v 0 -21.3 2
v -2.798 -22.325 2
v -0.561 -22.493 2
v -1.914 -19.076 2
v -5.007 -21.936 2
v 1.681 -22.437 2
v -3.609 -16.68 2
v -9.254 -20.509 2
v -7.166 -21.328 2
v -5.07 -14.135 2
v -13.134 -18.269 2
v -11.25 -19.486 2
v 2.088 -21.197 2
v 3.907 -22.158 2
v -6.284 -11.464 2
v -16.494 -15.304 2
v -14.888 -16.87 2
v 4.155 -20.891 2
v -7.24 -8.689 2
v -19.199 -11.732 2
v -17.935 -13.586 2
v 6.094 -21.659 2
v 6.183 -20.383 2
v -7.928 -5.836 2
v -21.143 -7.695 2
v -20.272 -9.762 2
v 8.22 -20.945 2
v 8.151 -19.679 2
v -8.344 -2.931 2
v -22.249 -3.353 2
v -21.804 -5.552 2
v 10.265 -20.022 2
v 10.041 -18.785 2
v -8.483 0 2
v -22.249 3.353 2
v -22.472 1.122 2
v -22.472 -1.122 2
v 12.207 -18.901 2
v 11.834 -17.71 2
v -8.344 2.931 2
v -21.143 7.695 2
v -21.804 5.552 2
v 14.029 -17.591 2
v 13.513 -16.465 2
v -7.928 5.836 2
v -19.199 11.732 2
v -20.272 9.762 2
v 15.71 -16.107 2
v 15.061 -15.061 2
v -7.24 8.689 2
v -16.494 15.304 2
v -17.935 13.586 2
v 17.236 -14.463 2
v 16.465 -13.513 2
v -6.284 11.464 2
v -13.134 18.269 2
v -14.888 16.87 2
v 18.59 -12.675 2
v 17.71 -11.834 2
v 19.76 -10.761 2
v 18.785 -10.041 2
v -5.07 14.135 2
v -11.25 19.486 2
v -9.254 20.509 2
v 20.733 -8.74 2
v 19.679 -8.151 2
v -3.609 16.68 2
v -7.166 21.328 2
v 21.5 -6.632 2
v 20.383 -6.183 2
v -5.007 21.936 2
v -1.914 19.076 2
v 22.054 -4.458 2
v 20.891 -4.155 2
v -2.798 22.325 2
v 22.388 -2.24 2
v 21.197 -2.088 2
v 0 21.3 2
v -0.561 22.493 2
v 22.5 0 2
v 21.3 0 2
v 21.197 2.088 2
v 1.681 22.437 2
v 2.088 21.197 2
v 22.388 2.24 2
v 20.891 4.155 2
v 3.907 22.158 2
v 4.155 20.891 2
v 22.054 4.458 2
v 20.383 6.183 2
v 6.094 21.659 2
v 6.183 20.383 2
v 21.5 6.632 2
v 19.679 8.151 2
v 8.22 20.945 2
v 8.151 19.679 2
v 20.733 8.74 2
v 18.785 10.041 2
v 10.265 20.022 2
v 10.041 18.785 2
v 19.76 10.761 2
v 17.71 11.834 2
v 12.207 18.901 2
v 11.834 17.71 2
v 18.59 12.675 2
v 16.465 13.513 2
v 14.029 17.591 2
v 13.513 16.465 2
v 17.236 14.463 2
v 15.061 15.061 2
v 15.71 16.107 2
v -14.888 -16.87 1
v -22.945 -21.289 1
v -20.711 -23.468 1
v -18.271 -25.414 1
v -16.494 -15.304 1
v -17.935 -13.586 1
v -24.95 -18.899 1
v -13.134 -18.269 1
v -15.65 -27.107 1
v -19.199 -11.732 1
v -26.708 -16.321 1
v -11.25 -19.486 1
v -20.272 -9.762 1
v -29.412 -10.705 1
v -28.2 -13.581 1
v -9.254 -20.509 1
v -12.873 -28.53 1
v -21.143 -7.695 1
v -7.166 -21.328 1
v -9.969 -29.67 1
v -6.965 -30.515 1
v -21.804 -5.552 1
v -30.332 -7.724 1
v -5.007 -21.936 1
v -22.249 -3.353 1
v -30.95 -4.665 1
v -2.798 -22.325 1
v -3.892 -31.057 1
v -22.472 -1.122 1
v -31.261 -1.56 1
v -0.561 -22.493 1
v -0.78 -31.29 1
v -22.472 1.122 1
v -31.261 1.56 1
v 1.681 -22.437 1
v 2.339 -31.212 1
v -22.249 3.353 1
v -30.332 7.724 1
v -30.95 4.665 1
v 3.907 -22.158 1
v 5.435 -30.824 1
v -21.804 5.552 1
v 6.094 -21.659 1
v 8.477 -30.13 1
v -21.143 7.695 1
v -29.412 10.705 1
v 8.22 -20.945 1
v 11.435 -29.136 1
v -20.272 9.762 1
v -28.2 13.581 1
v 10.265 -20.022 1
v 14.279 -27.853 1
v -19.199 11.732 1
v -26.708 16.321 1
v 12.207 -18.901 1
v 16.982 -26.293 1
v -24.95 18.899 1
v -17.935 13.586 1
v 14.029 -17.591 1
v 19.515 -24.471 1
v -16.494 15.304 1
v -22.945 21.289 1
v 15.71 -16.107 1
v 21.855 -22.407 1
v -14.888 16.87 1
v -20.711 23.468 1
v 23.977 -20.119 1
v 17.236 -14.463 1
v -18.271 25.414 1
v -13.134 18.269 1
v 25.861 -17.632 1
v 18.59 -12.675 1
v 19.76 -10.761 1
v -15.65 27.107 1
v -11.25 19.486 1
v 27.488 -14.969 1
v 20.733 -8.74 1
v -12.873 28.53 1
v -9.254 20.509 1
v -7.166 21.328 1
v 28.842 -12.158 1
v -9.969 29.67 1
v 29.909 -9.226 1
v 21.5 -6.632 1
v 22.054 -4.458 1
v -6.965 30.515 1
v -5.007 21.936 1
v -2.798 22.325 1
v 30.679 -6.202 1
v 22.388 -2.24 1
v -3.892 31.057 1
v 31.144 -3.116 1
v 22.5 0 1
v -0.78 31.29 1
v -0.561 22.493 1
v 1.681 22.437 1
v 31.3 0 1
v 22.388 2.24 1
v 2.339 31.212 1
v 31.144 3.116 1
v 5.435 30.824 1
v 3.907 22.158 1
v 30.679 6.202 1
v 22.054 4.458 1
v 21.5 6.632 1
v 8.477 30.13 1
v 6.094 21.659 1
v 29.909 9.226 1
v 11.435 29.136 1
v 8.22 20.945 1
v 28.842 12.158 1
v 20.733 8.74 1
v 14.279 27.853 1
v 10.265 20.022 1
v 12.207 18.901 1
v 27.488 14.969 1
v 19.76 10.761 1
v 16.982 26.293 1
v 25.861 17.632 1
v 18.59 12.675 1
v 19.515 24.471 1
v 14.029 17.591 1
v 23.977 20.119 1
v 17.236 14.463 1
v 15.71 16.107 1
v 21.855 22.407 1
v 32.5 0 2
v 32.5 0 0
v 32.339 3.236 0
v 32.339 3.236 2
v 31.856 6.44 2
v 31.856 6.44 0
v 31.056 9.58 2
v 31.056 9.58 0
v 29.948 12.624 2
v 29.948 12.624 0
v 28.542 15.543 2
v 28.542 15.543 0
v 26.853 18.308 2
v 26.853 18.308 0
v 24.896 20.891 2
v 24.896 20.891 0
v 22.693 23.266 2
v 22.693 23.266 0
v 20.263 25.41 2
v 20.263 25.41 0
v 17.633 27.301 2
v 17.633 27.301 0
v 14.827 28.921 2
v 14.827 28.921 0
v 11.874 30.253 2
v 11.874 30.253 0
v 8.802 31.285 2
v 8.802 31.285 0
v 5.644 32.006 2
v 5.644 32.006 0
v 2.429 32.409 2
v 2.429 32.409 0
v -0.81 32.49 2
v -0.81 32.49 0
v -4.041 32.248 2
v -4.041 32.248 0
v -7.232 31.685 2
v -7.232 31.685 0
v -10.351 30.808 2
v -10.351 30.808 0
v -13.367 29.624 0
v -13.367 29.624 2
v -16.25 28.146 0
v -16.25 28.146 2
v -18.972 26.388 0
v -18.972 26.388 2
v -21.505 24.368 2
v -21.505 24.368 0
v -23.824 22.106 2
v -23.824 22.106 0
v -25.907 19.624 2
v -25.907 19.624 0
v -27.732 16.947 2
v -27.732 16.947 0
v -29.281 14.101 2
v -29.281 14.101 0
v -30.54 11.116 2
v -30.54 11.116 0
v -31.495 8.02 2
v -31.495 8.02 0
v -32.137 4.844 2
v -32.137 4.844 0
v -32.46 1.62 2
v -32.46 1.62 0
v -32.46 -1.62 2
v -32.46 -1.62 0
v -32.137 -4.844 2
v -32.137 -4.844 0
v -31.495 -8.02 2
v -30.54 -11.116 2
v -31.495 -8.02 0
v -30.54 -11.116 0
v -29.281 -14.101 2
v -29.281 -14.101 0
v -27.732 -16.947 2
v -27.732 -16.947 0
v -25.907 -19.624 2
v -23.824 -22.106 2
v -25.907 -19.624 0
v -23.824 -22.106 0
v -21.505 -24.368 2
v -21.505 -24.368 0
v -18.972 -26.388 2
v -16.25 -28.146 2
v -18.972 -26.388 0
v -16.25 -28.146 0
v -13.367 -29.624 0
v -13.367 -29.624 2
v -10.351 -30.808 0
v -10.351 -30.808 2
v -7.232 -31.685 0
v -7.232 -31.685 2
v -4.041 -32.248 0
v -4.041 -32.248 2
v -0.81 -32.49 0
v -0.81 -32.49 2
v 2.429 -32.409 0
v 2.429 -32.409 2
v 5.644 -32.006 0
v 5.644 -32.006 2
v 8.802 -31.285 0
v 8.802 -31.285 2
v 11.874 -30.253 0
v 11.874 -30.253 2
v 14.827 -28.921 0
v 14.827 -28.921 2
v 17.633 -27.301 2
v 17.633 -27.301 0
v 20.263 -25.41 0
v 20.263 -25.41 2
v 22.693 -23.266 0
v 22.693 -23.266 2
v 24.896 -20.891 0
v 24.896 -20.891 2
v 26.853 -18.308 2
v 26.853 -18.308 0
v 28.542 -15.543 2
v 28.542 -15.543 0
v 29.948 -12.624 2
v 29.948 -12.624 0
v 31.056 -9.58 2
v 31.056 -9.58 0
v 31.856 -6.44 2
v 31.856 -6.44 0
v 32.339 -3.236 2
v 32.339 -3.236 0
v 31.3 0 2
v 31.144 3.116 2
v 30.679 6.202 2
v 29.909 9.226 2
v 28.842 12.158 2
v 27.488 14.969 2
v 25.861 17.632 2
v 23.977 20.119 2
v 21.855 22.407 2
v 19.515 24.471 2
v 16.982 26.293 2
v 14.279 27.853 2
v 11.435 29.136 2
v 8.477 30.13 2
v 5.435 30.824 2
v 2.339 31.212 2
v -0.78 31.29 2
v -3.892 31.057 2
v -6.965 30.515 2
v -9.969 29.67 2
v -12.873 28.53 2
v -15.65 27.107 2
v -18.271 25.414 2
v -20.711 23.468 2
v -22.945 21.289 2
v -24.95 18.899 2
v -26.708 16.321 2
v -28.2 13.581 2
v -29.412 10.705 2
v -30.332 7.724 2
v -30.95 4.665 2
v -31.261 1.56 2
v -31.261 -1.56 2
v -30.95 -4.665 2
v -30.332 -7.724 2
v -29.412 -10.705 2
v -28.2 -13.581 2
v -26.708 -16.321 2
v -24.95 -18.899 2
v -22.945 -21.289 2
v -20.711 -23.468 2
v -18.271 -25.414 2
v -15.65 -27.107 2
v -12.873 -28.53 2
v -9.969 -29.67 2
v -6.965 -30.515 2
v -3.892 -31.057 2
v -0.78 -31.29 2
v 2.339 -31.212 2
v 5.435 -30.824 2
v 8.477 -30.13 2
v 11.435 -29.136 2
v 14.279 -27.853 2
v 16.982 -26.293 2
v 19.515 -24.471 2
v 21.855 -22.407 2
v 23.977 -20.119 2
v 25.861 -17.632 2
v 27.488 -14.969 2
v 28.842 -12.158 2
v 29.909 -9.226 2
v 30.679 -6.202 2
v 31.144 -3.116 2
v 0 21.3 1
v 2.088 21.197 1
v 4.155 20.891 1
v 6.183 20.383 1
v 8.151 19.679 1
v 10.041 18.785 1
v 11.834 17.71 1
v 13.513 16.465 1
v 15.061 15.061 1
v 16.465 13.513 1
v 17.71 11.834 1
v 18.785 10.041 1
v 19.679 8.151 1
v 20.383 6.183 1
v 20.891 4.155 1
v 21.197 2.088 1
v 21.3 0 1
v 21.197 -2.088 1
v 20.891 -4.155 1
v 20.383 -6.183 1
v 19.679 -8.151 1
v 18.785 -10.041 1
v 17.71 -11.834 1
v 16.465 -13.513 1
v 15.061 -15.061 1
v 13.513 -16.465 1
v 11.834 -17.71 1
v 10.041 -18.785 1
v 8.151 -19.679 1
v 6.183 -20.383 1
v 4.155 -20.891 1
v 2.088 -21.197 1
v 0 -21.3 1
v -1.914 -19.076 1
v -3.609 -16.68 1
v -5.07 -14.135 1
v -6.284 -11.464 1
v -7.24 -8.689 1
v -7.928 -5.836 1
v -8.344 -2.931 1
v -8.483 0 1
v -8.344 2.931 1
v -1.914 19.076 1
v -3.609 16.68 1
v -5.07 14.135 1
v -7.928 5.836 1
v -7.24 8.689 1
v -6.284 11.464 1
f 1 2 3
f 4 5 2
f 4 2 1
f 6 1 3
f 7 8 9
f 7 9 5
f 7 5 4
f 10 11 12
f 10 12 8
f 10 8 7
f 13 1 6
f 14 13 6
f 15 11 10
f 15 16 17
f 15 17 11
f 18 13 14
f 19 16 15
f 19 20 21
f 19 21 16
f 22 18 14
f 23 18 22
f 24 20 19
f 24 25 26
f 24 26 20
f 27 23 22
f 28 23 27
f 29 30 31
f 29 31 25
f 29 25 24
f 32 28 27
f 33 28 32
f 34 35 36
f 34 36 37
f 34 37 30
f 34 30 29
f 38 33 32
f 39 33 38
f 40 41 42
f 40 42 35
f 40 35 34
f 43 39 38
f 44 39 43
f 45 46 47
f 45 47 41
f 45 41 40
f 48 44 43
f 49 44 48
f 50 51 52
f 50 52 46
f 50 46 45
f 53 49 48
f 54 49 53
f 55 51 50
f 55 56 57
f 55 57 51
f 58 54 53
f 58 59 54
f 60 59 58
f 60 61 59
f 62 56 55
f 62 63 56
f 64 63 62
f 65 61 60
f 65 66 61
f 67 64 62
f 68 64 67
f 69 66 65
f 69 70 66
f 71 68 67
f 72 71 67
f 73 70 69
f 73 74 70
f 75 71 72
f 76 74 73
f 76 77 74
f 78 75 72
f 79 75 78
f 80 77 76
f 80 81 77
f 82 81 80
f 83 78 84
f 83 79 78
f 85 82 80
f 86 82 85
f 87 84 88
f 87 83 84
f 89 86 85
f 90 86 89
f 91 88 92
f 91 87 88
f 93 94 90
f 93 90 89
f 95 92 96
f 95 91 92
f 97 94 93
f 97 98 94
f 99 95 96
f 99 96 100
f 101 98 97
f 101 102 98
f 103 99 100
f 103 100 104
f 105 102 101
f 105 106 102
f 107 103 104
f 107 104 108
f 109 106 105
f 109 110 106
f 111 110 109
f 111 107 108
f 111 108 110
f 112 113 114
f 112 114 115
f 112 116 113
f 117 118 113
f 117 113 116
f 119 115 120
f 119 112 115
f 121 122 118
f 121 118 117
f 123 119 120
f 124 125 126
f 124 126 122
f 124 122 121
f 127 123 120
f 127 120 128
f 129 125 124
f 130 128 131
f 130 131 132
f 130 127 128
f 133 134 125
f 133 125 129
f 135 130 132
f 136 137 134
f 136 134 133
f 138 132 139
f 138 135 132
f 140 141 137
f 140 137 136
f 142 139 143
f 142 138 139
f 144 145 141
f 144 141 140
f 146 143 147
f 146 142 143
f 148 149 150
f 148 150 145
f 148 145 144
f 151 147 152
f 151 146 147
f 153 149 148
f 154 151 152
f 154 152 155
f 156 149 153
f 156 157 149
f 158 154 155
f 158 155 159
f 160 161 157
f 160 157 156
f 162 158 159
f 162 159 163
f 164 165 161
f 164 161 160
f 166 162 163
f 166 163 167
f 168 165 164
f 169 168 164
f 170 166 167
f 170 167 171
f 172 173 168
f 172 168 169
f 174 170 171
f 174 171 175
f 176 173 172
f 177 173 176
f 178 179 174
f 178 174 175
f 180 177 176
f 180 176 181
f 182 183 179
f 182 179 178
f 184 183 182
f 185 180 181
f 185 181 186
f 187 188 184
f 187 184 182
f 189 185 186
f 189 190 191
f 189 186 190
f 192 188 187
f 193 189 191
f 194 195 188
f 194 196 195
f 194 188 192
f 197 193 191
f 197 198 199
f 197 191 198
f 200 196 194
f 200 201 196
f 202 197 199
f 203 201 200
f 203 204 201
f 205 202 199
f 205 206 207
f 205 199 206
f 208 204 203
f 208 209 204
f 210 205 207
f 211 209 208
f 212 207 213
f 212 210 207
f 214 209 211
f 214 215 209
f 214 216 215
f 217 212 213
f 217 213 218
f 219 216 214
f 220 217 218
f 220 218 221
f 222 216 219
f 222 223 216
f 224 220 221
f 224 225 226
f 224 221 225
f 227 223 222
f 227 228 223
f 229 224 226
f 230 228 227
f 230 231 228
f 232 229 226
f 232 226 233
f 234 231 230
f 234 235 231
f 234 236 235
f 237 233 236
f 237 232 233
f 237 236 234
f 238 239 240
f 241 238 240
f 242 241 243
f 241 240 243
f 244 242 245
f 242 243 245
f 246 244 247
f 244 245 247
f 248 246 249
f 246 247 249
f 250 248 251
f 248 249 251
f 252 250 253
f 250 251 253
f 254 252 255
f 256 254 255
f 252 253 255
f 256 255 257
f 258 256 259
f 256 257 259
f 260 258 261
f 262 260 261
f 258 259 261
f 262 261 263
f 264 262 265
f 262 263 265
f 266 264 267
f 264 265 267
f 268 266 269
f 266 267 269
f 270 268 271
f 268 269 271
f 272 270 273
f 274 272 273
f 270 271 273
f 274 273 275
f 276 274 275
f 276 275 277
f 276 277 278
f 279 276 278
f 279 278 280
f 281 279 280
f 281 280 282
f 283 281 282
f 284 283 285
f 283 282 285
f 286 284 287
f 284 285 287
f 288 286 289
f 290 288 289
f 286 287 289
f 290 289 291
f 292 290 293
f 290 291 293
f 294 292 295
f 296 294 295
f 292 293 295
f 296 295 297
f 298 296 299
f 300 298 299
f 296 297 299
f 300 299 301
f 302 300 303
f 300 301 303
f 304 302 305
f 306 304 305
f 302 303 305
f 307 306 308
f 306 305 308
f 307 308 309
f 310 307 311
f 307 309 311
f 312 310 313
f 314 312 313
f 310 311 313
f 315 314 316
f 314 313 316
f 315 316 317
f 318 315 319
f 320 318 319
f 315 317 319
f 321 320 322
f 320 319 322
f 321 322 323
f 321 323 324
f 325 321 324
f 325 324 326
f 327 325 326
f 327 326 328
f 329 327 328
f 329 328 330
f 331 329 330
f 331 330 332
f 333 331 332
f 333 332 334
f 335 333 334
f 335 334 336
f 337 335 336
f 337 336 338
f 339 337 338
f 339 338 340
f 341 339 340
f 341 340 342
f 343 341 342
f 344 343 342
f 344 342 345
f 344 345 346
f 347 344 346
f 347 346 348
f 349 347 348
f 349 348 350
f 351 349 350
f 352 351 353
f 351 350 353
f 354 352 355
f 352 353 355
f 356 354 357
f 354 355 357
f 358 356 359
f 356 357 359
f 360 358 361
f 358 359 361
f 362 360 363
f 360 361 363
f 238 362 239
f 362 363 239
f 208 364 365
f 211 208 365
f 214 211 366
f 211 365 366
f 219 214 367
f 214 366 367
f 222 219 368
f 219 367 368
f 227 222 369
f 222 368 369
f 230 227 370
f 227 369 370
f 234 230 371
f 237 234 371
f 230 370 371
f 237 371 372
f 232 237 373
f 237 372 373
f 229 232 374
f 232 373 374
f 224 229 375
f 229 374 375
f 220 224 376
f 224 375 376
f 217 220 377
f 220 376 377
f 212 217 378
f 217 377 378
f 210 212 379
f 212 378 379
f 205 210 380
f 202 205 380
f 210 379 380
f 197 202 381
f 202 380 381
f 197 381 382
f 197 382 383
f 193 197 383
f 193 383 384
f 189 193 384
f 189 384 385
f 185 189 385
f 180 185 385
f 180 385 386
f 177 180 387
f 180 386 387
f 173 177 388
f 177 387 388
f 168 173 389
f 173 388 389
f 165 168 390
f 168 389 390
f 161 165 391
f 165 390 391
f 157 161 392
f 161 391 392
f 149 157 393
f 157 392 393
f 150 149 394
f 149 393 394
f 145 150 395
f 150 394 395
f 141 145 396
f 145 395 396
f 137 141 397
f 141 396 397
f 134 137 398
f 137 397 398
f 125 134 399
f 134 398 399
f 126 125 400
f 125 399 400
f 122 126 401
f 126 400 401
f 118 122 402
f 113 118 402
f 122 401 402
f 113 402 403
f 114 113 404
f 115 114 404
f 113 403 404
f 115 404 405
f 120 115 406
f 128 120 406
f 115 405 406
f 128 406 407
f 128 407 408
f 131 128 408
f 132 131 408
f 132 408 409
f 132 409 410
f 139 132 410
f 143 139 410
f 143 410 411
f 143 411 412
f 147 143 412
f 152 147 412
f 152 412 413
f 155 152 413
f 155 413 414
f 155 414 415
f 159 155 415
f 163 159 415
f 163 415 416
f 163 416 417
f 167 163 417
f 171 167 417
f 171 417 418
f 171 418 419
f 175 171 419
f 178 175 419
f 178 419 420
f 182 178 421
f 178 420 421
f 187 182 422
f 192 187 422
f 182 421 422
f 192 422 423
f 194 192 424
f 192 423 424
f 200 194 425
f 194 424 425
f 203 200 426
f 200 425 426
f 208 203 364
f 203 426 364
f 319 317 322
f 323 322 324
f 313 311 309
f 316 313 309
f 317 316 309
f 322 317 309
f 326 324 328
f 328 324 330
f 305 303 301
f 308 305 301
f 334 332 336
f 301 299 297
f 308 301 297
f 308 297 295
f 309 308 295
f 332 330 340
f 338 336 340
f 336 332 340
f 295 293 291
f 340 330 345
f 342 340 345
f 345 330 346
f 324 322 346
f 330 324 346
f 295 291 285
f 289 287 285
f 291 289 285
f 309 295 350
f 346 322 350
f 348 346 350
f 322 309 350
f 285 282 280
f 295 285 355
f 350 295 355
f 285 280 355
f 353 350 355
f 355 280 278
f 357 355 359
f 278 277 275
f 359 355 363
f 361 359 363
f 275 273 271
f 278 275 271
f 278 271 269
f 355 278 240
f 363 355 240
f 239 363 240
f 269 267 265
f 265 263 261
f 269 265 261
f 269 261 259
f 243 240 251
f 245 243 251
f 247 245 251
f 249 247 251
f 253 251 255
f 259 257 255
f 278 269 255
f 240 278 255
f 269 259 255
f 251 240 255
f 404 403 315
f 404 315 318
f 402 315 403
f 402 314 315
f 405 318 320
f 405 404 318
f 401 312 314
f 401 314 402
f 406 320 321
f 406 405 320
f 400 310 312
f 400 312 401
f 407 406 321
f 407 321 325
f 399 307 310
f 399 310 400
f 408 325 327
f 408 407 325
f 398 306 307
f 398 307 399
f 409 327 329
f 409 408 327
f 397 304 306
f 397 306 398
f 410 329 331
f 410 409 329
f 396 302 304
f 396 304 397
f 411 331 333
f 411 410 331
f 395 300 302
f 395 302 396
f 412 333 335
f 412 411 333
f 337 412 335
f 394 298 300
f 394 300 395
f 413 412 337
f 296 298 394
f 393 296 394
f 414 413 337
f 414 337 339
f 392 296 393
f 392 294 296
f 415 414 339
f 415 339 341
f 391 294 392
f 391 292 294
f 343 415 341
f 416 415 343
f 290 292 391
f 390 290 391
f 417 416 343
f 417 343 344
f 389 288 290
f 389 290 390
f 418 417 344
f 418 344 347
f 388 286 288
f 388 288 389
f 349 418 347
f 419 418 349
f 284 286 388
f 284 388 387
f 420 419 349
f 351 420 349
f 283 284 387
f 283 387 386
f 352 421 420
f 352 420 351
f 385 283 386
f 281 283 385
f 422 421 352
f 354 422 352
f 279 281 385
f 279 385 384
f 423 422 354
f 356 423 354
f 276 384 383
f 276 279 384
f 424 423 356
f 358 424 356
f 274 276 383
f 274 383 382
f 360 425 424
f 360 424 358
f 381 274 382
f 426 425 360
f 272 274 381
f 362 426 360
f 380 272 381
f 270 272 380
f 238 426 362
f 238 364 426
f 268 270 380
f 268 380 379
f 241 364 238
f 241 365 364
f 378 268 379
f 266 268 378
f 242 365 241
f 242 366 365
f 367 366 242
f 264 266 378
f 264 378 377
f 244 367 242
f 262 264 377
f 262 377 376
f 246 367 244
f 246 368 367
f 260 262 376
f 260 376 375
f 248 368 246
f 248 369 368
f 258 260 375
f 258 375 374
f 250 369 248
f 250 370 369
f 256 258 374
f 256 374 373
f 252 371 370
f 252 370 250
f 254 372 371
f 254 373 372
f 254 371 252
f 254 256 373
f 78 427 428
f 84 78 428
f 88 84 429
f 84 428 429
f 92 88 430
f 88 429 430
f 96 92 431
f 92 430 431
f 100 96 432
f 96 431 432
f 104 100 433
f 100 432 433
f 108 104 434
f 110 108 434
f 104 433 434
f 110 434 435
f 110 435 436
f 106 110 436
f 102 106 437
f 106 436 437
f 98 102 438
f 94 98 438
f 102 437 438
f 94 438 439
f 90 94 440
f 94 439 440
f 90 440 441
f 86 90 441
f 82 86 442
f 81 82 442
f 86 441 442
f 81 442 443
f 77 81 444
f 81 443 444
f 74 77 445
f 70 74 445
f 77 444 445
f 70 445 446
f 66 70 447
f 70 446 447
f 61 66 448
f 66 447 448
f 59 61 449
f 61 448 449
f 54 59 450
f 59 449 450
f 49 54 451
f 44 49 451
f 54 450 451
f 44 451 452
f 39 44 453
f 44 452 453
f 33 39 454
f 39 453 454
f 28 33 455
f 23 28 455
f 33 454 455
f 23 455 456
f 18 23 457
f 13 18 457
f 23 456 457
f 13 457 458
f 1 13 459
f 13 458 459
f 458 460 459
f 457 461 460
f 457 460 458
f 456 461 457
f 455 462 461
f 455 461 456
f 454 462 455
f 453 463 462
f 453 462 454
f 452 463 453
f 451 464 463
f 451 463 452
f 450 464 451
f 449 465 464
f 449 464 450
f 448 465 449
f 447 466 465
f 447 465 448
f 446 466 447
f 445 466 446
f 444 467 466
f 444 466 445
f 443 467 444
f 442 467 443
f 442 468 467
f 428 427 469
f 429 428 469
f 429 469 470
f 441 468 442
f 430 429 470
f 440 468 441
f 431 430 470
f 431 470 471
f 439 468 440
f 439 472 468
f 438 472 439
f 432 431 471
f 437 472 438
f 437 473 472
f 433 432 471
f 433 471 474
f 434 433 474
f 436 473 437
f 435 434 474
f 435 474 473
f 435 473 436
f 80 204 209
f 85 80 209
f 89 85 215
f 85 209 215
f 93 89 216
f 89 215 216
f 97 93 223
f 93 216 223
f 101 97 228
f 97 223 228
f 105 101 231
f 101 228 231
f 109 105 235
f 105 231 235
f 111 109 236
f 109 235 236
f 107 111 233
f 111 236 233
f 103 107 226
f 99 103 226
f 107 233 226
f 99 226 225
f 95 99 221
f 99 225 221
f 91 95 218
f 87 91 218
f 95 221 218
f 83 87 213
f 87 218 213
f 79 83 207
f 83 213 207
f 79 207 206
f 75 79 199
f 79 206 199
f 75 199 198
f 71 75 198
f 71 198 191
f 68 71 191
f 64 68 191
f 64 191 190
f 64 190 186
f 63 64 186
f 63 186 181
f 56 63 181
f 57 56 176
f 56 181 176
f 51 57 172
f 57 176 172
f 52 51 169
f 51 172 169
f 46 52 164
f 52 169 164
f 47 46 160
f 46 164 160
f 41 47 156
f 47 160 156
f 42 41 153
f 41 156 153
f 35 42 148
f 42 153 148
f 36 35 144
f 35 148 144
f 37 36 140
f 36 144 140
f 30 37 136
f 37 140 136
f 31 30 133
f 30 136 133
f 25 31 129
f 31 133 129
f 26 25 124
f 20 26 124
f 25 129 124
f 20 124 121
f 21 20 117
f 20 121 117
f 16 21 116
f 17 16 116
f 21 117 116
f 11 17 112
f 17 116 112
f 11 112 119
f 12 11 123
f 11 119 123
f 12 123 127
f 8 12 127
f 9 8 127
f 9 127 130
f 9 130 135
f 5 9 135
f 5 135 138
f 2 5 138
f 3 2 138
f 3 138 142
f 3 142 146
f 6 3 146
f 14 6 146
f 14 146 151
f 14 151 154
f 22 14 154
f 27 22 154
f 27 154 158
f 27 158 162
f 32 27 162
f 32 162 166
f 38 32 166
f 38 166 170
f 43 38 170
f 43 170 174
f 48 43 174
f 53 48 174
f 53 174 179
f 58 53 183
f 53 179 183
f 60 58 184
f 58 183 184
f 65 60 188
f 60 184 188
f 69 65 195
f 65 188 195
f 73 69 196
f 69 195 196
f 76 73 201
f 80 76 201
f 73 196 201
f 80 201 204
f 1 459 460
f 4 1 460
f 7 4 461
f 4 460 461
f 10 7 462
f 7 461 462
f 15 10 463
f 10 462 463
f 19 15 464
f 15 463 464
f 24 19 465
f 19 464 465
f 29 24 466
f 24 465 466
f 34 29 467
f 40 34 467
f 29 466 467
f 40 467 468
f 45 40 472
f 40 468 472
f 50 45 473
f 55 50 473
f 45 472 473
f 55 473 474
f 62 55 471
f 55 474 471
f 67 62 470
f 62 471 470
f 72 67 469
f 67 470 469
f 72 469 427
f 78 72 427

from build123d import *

# Parameters (mm, degrees)
F0_R     = 32.5
F1_DEPTH = 2
F2_R     = 31.3
F3_DEPTH = 1
F4_R     = 22.5
F5_DEPTH = 1


with BuildPart() as f1:
    # F0 (on Top) → F1 (new body)
    with BuildSketch(Plane.XY):
        Circle(F0_R)
    extrude(amount=F1_DEPTH)

    # F2 (on face) → F3 (cut)
    with BuildSketch(Plane.XY.offset(2)):
        Circle(F2_R)
    extrude(amount=-F3_DEPTH, mode=Mode.SUBTRACT)

    # F4 (on face) → F5 (join)
    with BuildSketch(Plane.XY.offset(1)):
        Circle(F4_R)
        with BuildLine():
            ThreePointArc((0, -21.3), (-8.482899, 0), (0, 21.3))
            ThreePointArc((0, 21.3), (21.3, 0), (0, -21.3))
        make_face(mode=Mode.SUBTRACT)
    extrude(amount=F5_DEPTH)


solid = f1.part
